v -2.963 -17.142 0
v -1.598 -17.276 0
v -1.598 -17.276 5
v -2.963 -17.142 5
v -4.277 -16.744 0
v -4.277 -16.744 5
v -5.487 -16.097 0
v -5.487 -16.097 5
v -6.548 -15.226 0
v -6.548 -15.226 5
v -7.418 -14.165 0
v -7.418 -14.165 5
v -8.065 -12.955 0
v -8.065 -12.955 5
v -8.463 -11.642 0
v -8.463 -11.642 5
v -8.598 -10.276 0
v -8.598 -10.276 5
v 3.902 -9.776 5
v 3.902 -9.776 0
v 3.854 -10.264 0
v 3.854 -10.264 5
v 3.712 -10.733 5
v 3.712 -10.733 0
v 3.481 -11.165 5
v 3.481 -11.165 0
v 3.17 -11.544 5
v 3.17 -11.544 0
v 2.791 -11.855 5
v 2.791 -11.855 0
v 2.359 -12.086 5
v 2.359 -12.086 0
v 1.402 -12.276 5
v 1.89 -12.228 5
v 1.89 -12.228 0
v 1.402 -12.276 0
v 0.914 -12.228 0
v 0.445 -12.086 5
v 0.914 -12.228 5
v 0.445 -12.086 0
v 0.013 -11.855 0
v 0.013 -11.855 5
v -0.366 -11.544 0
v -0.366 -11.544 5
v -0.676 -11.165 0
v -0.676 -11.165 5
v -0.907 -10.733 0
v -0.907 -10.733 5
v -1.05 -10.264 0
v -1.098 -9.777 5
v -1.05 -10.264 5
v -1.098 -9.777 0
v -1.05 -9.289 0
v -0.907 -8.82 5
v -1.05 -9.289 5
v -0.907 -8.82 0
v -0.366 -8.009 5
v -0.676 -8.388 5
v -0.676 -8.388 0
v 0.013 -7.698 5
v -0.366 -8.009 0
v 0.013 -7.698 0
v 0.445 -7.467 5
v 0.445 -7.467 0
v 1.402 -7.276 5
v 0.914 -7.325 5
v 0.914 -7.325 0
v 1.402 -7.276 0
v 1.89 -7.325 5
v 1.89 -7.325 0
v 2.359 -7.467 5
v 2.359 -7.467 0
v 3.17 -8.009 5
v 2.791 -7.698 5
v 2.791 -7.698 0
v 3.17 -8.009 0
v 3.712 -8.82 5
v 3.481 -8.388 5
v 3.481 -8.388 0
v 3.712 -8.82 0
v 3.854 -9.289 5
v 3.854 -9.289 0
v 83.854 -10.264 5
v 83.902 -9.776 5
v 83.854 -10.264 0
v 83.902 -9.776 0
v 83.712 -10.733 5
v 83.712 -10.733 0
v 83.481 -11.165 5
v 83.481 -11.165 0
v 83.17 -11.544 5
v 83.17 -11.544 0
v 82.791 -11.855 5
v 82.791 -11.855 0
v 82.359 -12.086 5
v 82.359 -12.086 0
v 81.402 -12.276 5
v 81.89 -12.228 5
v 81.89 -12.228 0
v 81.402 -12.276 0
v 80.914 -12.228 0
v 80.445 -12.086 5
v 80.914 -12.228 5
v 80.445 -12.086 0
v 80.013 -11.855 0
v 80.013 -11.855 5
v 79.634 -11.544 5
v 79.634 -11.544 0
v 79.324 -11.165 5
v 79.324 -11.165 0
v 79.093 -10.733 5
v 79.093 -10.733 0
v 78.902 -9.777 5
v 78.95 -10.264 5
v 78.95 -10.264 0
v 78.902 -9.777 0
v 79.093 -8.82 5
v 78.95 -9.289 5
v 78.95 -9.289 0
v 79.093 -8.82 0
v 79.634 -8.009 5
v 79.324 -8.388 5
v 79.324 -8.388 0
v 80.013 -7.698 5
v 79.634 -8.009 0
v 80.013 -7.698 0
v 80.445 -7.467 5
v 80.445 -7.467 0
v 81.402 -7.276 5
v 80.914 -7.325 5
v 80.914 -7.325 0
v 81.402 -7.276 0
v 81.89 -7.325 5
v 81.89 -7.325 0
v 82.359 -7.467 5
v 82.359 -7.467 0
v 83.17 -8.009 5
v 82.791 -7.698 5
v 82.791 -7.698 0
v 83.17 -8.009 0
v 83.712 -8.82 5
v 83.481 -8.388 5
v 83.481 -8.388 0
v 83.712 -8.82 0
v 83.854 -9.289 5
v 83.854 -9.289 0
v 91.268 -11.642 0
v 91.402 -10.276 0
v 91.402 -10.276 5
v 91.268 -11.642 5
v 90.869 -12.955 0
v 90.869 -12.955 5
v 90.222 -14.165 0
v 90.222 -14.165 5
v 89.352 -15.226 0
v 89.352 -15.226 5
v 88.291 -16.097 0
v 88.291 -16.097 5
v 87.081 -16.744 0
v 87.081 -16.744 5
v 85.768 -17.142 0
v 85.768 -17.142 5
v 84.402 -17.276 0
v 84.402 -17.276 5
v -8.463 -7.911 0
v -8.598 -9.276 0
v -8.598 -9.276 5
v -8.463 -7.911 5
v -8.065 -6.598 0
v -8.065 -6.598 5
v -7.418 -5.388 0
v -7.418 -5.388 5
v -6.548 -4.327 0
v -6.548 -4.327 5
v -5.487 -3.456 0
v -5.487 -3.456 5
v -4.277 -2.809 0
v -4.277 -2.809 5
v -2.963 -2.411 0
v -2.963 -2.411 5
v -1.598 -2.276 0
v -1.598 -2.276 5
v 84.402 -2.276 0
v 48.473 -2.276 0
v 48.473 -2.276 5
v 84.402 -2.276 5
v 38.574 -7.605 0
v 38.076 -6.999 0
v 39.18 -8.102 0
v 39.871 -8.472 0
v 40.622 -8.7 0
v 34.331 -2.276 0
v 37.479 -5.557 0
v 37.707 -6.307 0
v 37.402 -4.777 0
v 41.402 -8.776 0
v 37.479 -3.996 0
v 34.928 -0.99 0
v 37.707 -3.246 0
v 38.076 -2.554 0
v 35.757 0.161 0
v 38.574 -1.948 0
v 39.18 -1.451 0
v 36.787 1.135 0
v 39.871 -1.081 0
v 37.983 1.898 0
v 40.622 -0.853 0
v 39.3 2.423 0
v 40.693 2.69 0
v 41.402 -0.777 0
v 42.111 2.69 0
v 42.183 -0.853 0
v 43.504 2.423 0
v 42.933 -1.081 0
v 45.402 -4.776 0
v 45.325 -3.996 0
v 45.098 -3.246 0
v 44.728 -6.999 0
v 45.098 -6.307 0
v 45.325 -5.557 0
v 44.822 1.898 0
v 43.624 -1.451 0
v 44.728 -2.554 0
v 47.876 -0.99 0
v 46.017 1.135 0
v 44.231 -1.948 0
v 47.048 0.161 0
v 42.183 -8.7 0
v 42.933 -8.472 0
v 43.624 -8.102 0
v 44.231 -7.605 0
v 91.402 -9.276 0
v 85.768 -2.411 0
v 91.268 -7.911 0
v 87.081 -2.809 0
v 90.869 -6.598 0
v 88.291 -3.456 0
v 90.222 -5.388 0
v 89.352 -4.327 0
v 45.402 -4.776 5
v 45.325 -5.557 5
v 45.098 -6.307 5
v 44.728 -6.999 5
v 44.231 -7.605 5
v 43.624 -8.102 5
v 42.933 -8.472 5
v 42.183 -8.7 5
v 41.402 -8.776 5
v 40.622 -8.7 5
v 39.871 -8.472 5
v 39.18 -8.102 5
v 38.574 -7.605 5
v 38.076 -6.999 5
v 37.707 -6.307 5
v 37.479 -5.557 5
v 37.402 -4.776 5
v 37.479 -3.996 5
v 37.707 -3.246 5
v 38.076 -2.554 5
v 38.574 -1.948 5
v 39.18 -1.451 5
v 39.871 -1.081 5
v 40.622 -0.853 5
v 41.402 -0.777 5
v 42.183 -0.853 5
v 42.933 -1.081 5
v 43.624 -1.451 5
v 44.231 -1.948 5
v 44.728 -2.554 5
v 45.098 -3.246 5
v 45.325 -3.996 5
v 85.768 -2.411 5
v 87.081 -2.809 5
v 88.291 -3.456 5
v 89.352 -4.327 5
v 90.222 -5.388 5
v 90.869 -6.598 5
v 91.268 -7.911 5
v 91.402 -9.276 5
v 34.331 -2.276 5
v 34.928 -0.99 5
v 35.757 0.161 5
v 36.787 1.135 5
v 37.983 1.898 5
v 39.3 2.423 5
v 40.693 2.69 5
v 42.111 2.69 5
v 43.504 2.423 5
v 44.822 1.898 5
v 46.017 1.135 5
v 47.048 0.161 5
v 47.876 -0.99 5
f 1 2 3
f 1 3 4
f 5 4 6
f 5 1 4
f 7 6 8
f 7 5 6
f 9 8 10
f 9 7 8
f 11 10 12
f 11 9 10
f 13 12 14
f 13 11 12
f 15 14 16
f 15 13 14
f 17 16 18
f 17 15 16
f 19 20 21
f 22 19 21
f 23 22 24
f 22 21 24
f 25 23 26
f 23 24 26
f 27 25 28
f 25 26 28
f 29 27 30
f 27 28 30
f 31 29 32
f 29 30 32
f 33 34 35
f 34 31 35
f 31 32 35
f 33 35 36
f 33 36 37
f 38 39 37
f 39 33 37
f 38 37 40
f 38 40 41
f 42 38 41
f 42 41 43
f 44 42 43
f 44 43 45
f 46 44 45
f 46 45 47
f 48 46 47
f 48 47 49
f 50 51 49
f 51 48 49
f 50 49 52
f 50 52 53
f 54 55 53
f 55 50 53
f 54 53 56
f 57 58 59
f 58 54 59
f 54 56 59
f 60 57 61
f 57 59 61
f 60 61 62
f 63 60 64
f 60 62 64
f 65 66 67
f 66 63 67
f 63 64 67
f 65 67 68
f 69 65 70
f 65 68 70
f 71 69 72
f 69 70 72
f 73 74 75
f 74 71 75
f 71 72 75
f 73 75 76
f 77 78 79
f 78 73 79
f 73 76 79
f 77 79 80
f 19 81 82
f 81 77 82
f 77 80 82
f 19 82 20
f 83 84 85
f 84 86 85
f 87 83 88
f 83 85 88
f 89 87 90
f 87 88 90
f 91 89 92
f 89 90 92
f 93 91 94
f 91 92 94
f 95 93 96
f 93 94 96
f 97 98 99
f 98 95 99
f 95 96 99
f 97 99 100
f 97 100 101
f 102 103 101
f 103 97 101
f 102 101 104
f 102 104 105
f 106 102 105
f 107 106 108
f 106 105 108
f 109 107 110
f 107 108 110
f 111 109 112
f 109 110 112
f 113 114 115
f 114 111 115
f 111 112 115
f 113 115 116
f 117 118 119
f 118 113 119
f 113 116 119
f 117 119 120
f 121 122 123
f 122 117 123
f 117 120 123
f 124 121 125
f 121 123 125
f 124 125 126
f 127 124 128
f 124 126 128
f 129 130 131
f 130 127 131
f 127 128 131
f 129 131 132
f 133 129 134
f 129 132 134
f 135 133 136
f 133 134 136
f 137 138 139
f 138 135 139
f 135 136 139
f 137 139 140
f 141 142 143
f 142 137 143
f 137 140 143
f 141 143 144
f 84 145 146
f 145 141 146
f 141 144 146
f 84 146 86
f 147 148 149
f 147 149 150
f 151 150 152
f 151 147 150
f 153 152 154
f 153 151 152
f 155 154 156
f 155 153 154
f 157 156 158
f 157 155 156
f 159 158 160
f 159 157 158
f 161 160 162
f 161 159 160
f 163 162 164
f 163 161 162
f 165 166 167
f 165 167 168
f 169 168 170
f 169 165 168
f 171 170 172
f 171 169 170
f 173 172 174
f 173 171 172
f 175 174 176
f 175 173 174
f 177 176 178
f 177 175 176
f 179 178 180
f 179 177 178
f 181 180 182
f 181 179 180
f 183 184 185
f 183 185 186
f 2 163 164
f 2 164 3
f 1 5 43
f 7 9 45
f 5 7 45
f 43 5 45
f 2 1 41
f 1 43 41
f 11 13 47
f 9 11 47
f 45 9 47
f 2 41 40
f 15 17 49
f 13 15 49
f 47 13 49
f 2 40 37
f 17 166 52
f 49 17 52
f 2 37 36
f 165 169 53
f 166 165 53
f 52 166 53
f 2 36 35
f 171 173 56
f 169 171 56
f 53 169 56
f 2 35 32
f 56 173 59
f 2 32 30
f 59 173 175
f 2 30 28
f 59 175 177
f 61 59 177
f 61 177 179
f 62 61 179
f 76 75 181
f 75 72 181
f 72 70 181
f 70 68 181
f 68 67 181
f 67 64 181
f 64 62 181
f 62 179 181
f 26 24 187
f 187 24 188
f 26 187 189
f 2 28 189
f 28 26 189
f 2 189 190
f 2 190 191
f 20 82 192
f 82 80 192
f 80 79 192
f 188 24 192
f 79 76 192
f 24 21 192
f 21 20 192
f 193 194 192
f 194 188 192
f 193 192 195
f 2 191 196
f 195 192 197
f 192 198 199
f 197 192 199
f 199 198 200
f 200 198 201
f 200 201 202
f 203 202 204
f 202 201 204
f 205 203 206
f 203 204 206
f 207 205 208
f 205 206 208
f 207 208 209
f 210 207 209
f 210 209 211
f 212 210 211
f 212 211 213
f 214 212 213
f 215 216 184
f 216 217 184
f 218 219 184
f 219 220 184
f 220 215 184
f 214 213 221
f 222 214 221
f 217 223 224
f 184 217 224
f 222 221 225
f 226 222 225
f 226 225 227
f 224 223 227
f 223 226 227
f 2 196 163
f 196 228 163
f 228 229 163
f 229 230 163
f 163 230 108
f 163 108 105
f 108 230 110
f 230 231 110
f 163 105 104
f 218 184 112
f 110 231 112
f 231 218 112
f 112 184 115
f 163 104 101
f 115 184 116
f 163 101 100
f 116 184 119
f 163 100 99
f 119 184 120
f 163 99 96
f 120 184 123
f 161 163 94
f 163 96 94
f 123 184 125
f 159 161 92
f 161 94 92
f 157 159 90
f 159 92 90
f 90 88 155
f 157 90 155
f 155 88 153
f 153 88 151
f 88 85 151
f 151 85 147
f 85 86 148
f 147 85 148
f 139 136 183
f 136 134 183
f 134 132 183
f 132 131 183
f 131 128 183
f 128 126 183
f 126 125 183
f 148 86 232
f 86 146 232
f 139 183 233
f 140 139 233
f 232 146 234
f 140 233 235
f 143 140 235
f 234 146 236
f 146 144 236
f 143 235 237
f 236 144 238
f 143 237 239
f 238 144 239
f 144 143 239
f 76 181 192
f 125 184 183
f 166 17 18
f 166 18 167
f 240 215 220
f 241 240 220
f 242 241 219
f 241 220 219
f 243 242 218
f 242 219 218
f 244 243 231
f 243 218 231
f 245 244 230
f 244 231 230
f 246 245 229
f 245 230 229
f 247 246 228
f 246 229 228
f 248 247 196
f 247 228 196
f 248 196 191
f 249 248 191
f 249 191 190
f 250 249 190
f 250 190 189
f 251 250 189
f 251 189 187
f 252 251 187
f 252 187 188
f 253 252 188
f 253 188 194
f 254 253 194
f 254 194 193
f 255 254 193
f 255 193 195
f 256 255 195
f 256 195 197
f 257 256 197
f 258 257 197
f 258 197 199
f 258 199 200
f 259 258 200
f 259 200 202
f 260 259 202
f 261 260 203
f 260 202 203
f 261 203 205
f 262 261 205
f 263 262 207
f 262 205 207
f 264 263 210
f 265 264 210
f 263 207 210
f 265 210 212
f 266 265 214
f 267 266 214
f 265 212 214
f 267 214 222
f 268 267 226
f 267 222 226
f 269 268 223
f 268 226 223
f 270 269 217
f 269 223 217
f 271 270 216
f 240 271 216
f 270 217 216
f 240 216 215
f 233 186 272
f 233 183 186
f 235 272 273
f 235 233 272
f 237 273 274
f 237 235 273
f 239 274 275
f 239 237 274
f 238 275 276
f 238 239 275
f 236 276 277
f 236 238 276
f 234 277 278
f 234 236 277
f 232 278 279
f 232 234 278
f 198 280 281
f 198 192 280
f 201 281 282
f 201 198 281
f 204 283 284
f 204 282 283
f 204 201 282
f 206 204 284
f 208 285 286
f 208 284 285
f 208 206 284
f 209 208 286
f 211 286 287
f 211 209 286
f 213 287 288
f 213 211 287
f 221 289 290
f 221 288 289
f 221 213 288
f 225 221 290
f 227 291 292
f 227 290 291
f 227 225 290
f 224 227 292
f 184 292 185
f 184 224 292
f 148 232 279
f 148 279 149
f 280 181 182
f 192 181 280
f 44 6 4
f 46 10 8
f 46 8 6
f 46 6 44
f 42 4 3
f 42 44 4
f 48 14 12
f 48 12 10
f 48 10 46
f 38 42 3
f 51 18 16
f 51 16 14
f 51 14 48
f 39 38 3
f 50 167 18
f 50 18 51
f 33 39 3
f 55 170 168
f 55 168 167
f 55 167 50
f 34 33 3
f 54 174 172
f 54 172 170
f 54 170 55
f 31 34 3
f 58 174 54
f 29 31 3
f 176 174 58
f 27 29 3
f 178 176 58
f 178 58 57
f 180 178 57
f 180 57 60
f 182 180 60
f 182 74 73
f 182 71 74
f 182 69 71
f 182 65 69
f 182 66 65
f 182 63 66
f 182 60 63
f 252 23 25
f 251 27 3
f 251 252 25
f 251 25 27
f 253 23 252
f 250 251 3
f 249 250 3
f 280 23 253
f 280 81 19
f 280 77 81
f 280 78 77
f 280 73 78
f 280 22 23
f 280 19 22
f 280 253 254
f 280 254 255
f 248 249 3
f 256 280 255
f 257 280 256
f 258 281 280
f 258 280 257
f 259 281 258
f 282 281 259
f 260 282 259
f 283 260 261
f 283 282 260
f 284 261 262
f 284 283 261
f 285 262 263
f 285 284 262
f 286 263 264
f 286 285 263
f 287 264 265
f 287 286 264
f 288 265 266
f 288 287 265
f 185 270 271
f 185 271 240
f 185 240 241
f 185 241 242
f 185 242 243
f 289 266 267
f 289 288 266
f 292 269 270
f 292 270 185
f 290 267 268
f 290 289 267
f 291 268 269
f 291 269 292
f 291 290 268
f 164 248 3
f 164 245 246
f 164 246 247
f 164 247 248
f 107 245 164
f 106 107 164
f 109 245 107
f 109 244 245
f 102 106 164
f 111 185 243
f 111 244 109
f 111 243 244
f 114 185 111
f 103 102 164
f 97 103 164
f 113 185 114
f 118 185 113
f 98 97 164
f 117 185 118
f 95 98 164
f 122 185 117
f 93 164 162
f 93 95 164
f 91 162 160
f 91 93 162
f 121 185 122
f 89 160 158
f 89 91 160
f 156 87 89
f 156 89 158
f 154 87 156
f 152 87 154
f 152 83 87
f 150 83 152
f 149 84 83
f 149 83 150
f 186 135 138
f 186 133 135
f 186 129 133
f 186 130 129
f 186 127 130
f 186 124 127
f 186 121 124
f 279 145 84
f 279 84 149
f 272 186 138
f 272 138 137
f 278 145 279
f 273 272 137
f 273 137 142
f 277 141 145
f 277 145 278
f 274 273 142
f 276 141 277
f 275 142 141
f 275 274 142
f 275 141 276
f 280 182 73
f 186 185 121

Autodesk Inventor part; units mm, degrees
ref_plane "YZ Plane" through (0, 0, 0) normal (1, 0, 0) x (0, 1, 0)
ref_plane "XZ Plane" through (0, 0, 0) normal (0, 1, 0) x (-1, 0, 0)
ref_plane "XY Plane" through (0, 0, 0) normal (0, 0, 1) x (1, 0, 0)
sketch "Sketch1" plane through (0, 0, 0) normal (0, 0, 1) x (1, 0, 0)
  line L0 (-1.5978, -2.2765) -> (34.3311, -2.2765)
  line L1 (91.4022, -9.2765) -> (91.4022, -10.2765)
  line L2 (84.4022, -17.2765) -> (-1.5978, -17.2765)
  line L3 (-8.5978, -10.2765) -> (-8.5978, -9.2765)
  arc A0 (-1.5978, -2.2765) -> (-8.5978, -9.2765) centre (-1.5978, -9.2765) ccw
  arc A1 (-8.5978, -10.2765) -> (-1.5978, -17.2765) centre (-1.5978, -10.2765) ccw
  arc A2 (84.4022, -17.2765) -> (91.4022, -10.2765) centre (84.4022, -10.2765) ccw
  arc A3 (91.4022, -9.2765) -> (84.4022, -2.2765) centre (84.4022, -9.2765) ccw
  circle A4 centre (1.4022, -9.7765) radius 2.5
  circle A5 centre (81.4022, -9.7765) radius 2.5
  circle A6 centre (41.4022, -4.7765) radius 4
  arc A7 (48.4732, -2.2765) -> (34.3311, -2.2765) centre (41.4022, -4.7765) ccw
  line L4 (34.3311, -2.2765) -> (48.4732, -2.2765)
  line L5 (48.4732, -2.2765) -> (84.4022, -2.2765)
  arc A8 (34.3311, -2.2765) -> (48.4732, -2.2765) centre (41.4022, -4.7765) ccw
  point P0 (0, 0)
  point P1 (91.4022, -17.2765)
  point P2 (91.4022, -2.2765)
  point P3 (-8.5978, -17.2765)
  point P4 (41.4022, -2.2765)
  dimension "d0" = 100
  dimension "d1" = 15
  dimension "d2" = 7
  dimension "d3" = 5
  dimension "d4" = 5
  dimension "d7" = 8
  dimension "d8" = 7.5
  dimension "d9" = 7.5
  dimension "d10" = 80
  dimension "d11" = 10
  dimension "d13" = 2.5
  dimension "d14" = 40
  dimension "d16" = 15
extrude "Extrusion1" add sketch "Sketch1" along normal blind 5 contours L0 A8 L5 A3 L1 A2 L2 A1 L3 A0 | A7 L4 A6 | L4 A6 A8
equation "\"d8\" = 0.5 * d1"
properties part number "lacznik_pary_kol_V3" material "Aluminum 6061"
